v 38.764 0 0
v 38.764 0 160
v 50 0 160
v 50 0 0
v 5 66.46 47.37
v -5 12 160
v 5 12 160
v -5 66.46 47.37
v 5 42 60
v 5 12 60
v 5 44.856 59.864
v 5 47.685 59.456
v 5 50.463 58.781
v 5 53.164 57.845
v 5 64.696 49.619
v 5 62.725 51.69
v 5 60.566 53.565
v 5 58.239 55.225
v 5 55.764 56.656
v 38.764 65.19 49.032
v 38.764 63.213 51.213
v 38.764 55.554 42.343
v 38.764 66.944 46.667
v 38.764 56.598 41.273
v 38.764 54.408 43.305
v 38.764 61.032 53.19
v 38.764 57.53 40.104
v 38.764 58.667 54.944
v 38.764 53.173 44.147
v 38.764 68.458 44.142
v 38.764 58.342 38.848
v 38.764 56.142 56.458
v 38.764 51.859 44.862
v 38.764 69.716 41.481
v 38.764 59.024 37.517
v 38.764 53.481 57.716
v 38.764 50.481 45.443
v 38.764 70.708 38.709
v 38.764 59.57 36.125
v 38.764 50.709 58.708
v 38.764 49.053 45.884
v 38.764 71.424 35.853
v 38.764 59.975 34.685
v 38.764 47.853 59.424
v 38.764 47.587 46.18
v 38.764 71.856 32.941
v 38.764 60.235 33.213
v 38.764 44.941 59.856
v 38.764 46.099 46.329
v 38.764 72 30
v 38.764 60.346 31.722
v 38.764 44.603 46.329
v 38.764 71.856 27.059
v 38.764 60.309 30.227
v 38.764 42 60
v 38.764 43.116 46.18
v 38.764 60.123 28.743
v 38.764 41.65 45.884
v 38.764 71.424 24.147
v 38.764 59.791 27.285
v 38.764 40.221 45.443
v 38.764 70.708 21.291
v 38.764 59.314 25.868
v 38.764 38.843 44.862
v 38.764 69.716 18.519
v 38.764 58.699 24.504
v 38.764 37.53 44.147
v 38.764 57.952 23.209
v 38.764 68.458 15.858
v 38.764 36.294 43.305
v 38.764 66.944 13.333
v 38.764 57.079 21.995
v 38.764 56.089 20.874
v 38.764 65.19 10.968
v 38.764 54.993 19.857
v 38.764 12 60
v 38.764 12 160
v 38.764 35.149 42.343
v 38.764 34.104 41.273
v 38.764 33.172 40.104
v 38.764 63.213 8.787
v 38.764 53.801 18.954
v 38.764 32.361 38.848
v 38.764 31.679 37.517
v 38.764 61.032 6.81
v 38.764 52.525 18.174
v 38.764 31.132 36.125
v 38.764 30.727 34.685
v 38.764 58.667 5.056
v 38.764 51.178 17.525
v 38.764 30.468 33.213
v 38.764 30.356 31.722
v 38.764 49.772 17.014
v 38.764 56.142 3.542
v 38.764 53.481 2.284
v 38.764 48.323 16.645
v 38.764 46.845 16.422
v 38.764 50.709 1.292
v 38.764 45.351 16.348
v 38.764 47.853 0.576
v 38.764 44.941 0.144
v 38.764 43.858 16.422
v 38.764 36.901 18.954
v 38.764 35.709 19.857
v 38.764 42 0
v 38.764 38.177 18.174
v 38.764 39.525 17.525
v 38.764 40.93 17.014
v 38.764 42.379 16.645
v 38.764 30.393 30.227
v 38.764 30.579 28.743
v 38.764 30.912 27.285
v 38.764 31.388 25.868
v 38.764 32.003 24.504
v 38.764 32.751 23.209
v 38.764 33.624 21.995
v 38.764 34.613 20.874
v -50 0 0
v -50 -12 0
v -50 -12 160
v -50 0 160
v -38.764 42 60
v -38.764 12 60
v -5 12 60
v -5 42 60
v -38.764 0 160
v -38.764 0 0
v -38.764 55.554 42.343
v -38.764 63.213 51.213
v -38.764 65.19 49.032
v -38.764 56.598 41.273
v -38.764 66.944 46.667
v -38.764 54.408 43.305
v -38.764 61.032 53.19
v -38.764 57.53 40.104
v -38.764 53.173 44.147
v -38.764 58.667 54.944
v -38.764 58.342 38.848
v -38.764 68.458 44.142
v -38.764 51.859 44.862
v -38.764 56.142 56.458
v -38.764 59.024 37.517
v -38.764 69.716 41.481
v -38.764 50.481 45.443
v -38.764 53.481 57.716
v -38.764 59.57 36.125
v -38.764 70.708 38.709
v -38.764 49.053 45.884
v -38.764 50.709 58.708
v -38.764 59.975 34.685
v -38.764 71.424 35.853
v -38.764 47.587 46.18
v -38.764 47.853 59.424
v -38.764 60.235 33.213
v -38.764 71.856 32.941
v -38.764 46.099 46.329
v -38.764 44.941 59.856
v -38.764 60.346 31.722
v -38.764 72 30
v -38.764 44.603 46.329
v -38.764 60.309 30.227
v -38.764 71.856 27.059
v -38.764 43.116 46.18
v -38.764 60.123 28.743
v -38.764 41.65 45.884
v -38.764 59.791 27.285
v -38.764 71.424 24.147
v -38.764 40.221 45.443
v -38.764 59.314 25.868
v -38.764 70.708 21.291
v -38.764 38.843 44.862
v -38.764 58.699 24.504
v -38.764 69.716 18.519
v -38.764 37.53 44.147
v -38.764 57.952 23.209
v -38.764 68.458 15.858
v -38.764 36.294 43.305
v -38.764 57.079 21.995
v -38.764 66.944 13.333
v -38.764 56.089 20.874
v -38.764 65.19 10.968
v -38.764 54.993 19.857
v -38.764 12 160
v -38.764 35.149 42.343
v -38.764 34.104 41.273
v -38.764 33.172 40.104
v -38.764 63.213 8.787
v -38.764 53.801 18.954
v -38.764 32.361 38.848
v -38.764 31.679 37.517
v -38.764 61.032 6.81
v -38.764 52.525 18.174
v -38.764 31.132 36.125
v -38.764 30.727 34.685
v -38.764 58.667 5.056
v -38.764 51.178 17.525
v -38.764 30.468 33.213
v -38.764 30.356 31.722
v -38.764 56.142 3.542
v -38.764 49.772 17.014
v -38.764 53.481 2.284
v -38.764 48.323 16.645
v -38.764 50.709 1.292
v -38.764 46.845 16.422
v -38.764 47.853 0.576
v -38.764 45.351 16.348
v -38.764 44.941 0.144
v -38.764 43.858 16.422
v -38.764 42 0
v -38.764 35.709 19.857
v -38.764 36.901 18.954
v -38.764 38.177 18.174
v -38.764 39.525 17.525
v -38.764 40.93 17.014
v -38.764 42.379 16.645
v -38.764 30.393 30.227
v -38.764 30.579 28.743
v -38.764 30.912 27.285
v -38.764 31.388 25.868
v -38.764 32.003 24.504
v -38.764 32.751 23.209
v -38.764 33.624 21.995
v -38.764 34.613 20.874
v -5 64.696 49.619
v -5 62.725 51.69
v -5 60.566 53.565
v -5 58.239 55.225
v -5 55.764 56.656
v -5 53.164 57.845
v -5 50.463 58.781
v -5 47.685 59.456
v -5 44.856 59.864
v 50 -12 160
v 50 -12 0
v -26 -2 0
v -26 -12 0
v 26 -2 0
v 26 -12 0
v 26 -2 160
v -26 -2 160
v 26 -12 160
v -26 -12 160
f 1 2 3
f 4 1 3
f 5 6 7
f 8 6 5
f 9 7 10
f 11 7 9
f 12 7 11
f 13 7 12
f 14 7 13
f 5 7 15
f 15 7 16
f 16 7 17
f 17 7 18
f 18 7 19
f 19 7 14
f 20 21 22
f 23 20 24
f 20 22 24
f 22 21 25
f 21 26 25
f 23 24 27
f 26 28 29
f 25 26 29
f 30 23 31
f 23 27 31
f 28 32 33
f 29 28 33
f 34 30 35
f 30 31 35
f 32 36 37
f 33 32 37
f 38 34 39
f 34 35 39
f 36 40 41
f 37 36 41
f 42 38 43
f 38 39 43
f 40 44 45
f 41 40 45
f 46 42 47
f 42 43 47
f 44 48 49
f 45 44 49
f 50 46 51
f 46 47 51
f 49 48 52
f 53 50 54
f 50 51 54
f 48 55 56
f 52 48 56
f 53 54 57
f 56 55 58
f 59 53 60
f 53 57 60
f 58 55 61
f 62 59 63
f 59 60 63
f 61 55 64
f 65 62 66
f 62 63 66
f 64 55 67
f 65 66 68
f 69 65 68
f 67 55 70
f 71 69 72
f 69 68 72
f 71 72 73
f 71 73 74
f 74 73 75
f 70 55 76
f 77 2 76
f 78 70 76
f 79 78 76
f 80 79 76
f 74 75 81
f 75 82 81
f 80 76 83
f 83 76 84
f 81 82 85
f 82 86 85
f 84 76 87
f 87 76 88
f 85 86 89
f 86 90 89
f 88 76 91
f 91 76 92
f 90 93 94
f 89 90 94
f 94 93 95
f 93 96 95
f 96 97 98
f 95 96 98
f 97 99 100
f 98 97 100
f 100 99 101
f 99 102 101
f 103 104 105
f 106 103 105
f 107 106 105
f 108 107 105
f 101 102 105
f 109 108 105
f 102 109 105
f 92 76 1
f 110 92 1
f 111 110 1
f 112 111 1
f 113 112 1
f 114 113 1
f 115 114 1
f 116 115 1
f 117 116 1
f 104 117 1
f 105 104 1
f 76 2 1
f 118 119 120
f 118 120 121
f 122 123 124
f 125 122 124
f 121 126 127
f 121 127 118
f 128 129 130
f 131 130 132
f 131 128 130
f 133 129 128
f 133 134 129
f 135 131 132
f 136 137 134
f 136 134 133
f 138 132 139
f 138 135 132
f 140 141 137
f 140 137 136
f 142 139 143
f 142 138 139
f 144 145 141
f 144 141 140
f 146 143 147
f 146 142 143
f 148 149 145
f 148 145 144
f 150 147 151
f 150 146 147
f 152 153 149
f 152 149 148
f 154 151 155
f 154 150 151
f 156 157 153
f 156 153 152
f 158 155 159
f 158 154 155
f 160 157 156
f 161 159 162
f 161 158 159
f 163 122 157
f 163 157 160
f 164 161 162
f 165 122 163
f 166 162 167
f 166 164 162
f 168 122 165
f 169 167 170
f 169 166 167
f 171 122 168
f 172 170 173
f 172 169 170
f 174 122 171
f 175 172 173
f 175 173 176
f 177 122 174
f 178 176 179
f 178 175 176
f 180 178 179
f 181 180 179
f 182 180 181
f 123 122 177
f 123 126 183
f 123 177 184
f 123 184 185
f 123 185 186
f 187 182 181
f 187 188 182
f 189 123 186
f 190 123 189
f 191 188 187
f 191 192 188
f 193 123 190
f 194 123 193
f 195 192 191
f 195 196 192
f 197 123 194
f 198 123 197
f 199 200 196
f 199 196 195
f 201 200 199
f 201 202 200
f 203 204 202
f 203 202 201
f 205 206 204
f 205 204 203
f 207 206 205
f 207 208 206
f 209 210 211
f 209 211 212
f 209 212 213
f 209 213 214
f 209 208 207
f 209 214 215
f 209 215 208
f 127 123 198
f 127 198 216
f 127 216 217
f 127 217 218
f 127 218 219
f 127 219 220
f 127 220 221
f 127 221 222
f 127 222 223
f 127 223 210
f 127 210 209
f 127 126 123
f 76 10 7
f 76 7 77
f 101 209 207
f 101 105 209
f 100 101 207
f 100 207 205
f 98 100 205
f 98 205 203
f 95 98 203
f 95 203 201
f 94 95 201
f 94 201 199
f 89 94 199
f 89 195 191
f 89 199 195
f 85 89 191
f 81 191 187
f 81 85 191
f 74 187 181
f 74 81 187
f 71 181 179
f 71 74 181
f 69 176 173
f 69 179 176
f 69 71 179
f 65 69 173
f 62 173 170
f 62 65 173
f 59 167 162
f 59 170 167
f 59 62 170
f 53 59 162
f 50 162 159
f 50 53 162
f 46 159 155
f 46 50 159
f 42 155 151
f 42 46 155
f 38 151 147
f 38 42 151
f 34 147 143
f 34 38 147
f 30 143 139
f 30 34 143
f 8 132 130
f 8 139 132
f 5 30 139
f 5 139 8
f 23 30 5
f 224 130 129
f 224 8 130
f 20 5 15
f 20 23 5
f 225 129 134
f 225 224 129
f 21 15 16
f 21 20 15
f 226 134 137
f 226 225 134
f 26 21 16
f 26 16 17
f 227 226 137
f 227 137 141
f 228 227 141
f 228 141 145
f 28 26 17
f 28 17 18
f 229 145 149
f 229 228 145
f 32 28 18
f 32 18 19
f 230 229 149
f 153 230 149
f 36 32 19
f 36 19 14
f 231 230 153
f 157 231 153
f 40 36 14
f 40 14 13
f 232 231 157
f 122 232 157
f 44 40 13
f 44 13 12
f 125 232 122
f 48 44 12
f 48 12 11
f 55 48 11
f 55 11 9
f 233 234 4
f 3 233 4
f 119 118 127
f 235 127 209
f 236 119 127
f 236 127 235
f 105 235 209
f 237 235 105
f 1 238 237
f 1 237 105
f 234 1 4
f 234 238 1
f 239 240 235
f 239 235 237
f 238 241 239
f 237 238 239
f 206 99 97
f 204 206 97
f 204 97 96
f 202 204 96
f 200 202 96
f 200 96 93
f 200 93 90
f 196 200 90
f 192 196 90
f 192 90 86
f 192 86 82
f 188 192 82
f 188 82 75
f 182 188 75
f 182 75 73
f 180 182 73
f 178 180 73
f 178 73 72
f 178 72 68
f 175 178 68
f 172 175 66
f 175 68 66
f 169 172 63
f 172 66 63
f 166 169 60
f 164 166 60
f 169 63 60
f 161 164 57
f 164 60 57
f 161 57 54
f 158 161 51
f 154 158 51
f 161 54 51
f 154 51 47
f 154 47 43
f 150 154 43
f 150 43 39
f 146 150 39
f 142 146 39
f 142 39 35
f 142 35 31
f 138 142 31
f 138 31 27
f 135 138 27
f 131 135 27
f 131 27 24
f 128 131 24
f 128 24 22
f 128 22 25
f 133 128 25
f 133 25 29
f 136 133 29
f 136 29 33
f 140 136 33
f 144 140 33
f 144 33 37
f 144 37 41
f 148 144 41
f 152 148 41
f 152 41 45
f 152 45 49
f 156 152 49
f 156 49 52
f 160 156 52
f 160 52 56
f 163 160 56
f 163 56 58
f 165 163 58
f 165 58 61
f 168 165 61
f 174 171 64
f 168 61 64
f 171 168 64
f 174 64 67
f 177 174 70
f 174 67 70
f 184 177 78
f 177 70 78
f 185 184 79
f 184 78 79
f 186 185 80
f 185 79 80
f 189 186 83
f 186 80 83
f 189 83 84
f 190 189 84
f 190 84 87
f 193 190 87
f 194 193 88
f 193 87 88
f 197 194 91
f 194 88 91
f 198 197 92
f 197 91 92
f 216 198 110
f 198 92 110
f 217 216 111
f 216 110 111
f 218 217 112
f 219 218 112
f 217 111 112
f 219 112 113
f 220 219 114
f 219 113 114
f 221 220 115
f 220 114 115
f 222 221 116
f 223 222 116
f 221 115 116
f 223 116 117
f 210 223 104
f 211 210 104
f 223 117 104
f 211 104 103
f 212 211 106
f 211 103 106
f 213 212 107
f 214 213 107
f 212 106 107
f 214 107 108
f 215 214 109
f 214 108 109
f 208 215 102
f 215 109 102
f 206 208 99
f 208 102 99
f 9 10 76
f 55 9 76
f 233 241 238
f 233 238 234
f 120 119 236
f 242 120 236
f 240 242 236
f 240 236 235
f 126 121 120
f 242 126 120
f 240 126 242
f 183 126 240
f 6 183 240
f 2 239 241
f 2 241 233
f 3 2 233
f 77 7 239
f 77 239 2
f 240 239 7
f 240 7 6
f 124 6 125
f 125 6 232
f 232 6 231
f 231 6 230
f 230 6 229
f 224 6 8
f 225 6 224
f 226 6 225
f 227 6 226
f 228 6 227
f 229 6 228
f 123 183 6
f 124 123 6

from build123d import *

# Parameters (mm, degrees)
SKETCH1_W           = 100
SKETCH1_H           = 24
BOSS_EXTRUDE1_DEPTH = 160
SKETCH2_W           = 52
SKETCH2_H           = 10
CUT_EXTRUDE1_DEPTH  = 169.059513268
SKETCH3_W           = 12
SKETCH3_H           = 12
CUT_EXTRUDE2_DEPTH  = 169.059513268
SKETCH4_W           = 77.52732848
SKETCH4_H           = 60
BOSS_EXTRUDE2_DEPTH = 60
FILLET1_RADIUS      = 30
FILLET1_LENGTH      = 77.52732848
SKETCH6_R           = 15
CUT_EXTRUDE3_DEPTH  = 197.629062169
RIB1_REACH          = 184.439
SKETCH7_WALL_W      = 501.963544736
SKETCH7_WALL_H      = 10


with BuildPart() as part:
    # Sketch1 → Boss-Extrude1 (new body)
    with BuildSketch(Plane.XY):
        Rectangle(SKETCH1_W, SKETCH1_H)
    extrude(amount=BOSS_EXTRUDE1_DEPTH)

    # Sketch2 → Cut-Extrude1 (cut, through all)
    with BuildSketch(Plane.XY.offset(160)):
        with Locations((0, -7)):
            Rectangle(SKETCH2_W, SKETCH2_H)
    extrude(amount=-CUT_EXTRUDE1_DEPTH, mode=Mode.SUBTRACT)

    # Sketch3 → Cut-Extrude2 (cut, through all)
    with BuildSketch(Plane.XY.offset(160)):
        with Locations((44.76366424, 6)):
            Rectangle(SKETCH3_W, SKETCH3_H)
    cut_extrude2 = extrude(amount=-CUT_EXTRUDE2_DEPTH, mode=Mode.SUBTRACT)

    # Mirror1: Cut-Extrude2 across plane
    add(cut_extrude2.mirror(Plane(origin=(0, 0, 0), x_dir=(0, 0, 1), z_dir=(1, 0, 0))), mode=Mode.SUBTRACT)

    # Sketch4 → Boss-Extrude2 (add)
    with BuildSketch(Plane(origin=(0, 12, 0), x_dir=(1, 0, 0), z_dir=(0, 1, 0))):
        with Locations((0, -30)):
            Rectangle(SKETCH4_W, SKETCH4_H)
    extrude(amount=BOSS_EXTRUDE2_DEPTH)

    # Fillet1: full round fillet: the end face becomes a half cylinder, R = half its width
    fillet1_face = Plane((0, 72, 30), x_dir=(1, 0, 0), z_dir=(0, 1, 0))  # on the end face: x along it, z out of the body
    fillet1_slab = fillet1_face.offset(-FILLET1_RADIUS / 2) * Box(FILLET1_LENGTH, 2 * FILLET1_RADIUS, FILLET1_RADIUS, mode=Mode.PRIVATE)  # the body's end, R deep
    fillet1_round = Plane((0, 42, 30), x_dir=(0, 1, 0), z_dir=(1, 0, 0)) * Cylinder(FILLET1_RADIUS, FILLET1_LENGTH, mode=Mode.PRIVATE)  # its axis R under the face
    add(fillet1_slab - fillet1_round, mode=Mode.SUBTRACT)

    # Sketch6 → Cut-Extrude3 (cut, through all)
    with BuildSketch(Plane(origin=(38.76366424, 0, 0), x_dir=(0, 0, -1), z_dir=(1, 0, 0))):
        with Locations((-31.347642199, 45.351147576)):
            Circle(SKETCH6_R)
    extrude(amount=-CUT_EXTRUDE3_DEPTH, mode=Mode.SUBTRACT)

    # Sketch7 wall → Rib1 (add, up to next)
    with BuildSketch(Plane(origin=(0, 41.402146272, 99.192634344), x_dir=(0, 0.435311709867, -0.900279798314), z_dir=(0, 0.900279798314, 0.435311709867)), mode=Mode.PRIVATE) as rib1_sk1:
        Rectangle(SKETCH7_WALL_W, SKETCH7_WALL_H)
    rib1_tool1 = extrude(rib1_sk1.sketch, amount=-RIB1_REACH, mode=Mode.PRIVATE) - part.part
    add(rib1_tool1.solids().sort_by_distance((0, 41.402146272, 99.192634344))[0])


solid = part.part
